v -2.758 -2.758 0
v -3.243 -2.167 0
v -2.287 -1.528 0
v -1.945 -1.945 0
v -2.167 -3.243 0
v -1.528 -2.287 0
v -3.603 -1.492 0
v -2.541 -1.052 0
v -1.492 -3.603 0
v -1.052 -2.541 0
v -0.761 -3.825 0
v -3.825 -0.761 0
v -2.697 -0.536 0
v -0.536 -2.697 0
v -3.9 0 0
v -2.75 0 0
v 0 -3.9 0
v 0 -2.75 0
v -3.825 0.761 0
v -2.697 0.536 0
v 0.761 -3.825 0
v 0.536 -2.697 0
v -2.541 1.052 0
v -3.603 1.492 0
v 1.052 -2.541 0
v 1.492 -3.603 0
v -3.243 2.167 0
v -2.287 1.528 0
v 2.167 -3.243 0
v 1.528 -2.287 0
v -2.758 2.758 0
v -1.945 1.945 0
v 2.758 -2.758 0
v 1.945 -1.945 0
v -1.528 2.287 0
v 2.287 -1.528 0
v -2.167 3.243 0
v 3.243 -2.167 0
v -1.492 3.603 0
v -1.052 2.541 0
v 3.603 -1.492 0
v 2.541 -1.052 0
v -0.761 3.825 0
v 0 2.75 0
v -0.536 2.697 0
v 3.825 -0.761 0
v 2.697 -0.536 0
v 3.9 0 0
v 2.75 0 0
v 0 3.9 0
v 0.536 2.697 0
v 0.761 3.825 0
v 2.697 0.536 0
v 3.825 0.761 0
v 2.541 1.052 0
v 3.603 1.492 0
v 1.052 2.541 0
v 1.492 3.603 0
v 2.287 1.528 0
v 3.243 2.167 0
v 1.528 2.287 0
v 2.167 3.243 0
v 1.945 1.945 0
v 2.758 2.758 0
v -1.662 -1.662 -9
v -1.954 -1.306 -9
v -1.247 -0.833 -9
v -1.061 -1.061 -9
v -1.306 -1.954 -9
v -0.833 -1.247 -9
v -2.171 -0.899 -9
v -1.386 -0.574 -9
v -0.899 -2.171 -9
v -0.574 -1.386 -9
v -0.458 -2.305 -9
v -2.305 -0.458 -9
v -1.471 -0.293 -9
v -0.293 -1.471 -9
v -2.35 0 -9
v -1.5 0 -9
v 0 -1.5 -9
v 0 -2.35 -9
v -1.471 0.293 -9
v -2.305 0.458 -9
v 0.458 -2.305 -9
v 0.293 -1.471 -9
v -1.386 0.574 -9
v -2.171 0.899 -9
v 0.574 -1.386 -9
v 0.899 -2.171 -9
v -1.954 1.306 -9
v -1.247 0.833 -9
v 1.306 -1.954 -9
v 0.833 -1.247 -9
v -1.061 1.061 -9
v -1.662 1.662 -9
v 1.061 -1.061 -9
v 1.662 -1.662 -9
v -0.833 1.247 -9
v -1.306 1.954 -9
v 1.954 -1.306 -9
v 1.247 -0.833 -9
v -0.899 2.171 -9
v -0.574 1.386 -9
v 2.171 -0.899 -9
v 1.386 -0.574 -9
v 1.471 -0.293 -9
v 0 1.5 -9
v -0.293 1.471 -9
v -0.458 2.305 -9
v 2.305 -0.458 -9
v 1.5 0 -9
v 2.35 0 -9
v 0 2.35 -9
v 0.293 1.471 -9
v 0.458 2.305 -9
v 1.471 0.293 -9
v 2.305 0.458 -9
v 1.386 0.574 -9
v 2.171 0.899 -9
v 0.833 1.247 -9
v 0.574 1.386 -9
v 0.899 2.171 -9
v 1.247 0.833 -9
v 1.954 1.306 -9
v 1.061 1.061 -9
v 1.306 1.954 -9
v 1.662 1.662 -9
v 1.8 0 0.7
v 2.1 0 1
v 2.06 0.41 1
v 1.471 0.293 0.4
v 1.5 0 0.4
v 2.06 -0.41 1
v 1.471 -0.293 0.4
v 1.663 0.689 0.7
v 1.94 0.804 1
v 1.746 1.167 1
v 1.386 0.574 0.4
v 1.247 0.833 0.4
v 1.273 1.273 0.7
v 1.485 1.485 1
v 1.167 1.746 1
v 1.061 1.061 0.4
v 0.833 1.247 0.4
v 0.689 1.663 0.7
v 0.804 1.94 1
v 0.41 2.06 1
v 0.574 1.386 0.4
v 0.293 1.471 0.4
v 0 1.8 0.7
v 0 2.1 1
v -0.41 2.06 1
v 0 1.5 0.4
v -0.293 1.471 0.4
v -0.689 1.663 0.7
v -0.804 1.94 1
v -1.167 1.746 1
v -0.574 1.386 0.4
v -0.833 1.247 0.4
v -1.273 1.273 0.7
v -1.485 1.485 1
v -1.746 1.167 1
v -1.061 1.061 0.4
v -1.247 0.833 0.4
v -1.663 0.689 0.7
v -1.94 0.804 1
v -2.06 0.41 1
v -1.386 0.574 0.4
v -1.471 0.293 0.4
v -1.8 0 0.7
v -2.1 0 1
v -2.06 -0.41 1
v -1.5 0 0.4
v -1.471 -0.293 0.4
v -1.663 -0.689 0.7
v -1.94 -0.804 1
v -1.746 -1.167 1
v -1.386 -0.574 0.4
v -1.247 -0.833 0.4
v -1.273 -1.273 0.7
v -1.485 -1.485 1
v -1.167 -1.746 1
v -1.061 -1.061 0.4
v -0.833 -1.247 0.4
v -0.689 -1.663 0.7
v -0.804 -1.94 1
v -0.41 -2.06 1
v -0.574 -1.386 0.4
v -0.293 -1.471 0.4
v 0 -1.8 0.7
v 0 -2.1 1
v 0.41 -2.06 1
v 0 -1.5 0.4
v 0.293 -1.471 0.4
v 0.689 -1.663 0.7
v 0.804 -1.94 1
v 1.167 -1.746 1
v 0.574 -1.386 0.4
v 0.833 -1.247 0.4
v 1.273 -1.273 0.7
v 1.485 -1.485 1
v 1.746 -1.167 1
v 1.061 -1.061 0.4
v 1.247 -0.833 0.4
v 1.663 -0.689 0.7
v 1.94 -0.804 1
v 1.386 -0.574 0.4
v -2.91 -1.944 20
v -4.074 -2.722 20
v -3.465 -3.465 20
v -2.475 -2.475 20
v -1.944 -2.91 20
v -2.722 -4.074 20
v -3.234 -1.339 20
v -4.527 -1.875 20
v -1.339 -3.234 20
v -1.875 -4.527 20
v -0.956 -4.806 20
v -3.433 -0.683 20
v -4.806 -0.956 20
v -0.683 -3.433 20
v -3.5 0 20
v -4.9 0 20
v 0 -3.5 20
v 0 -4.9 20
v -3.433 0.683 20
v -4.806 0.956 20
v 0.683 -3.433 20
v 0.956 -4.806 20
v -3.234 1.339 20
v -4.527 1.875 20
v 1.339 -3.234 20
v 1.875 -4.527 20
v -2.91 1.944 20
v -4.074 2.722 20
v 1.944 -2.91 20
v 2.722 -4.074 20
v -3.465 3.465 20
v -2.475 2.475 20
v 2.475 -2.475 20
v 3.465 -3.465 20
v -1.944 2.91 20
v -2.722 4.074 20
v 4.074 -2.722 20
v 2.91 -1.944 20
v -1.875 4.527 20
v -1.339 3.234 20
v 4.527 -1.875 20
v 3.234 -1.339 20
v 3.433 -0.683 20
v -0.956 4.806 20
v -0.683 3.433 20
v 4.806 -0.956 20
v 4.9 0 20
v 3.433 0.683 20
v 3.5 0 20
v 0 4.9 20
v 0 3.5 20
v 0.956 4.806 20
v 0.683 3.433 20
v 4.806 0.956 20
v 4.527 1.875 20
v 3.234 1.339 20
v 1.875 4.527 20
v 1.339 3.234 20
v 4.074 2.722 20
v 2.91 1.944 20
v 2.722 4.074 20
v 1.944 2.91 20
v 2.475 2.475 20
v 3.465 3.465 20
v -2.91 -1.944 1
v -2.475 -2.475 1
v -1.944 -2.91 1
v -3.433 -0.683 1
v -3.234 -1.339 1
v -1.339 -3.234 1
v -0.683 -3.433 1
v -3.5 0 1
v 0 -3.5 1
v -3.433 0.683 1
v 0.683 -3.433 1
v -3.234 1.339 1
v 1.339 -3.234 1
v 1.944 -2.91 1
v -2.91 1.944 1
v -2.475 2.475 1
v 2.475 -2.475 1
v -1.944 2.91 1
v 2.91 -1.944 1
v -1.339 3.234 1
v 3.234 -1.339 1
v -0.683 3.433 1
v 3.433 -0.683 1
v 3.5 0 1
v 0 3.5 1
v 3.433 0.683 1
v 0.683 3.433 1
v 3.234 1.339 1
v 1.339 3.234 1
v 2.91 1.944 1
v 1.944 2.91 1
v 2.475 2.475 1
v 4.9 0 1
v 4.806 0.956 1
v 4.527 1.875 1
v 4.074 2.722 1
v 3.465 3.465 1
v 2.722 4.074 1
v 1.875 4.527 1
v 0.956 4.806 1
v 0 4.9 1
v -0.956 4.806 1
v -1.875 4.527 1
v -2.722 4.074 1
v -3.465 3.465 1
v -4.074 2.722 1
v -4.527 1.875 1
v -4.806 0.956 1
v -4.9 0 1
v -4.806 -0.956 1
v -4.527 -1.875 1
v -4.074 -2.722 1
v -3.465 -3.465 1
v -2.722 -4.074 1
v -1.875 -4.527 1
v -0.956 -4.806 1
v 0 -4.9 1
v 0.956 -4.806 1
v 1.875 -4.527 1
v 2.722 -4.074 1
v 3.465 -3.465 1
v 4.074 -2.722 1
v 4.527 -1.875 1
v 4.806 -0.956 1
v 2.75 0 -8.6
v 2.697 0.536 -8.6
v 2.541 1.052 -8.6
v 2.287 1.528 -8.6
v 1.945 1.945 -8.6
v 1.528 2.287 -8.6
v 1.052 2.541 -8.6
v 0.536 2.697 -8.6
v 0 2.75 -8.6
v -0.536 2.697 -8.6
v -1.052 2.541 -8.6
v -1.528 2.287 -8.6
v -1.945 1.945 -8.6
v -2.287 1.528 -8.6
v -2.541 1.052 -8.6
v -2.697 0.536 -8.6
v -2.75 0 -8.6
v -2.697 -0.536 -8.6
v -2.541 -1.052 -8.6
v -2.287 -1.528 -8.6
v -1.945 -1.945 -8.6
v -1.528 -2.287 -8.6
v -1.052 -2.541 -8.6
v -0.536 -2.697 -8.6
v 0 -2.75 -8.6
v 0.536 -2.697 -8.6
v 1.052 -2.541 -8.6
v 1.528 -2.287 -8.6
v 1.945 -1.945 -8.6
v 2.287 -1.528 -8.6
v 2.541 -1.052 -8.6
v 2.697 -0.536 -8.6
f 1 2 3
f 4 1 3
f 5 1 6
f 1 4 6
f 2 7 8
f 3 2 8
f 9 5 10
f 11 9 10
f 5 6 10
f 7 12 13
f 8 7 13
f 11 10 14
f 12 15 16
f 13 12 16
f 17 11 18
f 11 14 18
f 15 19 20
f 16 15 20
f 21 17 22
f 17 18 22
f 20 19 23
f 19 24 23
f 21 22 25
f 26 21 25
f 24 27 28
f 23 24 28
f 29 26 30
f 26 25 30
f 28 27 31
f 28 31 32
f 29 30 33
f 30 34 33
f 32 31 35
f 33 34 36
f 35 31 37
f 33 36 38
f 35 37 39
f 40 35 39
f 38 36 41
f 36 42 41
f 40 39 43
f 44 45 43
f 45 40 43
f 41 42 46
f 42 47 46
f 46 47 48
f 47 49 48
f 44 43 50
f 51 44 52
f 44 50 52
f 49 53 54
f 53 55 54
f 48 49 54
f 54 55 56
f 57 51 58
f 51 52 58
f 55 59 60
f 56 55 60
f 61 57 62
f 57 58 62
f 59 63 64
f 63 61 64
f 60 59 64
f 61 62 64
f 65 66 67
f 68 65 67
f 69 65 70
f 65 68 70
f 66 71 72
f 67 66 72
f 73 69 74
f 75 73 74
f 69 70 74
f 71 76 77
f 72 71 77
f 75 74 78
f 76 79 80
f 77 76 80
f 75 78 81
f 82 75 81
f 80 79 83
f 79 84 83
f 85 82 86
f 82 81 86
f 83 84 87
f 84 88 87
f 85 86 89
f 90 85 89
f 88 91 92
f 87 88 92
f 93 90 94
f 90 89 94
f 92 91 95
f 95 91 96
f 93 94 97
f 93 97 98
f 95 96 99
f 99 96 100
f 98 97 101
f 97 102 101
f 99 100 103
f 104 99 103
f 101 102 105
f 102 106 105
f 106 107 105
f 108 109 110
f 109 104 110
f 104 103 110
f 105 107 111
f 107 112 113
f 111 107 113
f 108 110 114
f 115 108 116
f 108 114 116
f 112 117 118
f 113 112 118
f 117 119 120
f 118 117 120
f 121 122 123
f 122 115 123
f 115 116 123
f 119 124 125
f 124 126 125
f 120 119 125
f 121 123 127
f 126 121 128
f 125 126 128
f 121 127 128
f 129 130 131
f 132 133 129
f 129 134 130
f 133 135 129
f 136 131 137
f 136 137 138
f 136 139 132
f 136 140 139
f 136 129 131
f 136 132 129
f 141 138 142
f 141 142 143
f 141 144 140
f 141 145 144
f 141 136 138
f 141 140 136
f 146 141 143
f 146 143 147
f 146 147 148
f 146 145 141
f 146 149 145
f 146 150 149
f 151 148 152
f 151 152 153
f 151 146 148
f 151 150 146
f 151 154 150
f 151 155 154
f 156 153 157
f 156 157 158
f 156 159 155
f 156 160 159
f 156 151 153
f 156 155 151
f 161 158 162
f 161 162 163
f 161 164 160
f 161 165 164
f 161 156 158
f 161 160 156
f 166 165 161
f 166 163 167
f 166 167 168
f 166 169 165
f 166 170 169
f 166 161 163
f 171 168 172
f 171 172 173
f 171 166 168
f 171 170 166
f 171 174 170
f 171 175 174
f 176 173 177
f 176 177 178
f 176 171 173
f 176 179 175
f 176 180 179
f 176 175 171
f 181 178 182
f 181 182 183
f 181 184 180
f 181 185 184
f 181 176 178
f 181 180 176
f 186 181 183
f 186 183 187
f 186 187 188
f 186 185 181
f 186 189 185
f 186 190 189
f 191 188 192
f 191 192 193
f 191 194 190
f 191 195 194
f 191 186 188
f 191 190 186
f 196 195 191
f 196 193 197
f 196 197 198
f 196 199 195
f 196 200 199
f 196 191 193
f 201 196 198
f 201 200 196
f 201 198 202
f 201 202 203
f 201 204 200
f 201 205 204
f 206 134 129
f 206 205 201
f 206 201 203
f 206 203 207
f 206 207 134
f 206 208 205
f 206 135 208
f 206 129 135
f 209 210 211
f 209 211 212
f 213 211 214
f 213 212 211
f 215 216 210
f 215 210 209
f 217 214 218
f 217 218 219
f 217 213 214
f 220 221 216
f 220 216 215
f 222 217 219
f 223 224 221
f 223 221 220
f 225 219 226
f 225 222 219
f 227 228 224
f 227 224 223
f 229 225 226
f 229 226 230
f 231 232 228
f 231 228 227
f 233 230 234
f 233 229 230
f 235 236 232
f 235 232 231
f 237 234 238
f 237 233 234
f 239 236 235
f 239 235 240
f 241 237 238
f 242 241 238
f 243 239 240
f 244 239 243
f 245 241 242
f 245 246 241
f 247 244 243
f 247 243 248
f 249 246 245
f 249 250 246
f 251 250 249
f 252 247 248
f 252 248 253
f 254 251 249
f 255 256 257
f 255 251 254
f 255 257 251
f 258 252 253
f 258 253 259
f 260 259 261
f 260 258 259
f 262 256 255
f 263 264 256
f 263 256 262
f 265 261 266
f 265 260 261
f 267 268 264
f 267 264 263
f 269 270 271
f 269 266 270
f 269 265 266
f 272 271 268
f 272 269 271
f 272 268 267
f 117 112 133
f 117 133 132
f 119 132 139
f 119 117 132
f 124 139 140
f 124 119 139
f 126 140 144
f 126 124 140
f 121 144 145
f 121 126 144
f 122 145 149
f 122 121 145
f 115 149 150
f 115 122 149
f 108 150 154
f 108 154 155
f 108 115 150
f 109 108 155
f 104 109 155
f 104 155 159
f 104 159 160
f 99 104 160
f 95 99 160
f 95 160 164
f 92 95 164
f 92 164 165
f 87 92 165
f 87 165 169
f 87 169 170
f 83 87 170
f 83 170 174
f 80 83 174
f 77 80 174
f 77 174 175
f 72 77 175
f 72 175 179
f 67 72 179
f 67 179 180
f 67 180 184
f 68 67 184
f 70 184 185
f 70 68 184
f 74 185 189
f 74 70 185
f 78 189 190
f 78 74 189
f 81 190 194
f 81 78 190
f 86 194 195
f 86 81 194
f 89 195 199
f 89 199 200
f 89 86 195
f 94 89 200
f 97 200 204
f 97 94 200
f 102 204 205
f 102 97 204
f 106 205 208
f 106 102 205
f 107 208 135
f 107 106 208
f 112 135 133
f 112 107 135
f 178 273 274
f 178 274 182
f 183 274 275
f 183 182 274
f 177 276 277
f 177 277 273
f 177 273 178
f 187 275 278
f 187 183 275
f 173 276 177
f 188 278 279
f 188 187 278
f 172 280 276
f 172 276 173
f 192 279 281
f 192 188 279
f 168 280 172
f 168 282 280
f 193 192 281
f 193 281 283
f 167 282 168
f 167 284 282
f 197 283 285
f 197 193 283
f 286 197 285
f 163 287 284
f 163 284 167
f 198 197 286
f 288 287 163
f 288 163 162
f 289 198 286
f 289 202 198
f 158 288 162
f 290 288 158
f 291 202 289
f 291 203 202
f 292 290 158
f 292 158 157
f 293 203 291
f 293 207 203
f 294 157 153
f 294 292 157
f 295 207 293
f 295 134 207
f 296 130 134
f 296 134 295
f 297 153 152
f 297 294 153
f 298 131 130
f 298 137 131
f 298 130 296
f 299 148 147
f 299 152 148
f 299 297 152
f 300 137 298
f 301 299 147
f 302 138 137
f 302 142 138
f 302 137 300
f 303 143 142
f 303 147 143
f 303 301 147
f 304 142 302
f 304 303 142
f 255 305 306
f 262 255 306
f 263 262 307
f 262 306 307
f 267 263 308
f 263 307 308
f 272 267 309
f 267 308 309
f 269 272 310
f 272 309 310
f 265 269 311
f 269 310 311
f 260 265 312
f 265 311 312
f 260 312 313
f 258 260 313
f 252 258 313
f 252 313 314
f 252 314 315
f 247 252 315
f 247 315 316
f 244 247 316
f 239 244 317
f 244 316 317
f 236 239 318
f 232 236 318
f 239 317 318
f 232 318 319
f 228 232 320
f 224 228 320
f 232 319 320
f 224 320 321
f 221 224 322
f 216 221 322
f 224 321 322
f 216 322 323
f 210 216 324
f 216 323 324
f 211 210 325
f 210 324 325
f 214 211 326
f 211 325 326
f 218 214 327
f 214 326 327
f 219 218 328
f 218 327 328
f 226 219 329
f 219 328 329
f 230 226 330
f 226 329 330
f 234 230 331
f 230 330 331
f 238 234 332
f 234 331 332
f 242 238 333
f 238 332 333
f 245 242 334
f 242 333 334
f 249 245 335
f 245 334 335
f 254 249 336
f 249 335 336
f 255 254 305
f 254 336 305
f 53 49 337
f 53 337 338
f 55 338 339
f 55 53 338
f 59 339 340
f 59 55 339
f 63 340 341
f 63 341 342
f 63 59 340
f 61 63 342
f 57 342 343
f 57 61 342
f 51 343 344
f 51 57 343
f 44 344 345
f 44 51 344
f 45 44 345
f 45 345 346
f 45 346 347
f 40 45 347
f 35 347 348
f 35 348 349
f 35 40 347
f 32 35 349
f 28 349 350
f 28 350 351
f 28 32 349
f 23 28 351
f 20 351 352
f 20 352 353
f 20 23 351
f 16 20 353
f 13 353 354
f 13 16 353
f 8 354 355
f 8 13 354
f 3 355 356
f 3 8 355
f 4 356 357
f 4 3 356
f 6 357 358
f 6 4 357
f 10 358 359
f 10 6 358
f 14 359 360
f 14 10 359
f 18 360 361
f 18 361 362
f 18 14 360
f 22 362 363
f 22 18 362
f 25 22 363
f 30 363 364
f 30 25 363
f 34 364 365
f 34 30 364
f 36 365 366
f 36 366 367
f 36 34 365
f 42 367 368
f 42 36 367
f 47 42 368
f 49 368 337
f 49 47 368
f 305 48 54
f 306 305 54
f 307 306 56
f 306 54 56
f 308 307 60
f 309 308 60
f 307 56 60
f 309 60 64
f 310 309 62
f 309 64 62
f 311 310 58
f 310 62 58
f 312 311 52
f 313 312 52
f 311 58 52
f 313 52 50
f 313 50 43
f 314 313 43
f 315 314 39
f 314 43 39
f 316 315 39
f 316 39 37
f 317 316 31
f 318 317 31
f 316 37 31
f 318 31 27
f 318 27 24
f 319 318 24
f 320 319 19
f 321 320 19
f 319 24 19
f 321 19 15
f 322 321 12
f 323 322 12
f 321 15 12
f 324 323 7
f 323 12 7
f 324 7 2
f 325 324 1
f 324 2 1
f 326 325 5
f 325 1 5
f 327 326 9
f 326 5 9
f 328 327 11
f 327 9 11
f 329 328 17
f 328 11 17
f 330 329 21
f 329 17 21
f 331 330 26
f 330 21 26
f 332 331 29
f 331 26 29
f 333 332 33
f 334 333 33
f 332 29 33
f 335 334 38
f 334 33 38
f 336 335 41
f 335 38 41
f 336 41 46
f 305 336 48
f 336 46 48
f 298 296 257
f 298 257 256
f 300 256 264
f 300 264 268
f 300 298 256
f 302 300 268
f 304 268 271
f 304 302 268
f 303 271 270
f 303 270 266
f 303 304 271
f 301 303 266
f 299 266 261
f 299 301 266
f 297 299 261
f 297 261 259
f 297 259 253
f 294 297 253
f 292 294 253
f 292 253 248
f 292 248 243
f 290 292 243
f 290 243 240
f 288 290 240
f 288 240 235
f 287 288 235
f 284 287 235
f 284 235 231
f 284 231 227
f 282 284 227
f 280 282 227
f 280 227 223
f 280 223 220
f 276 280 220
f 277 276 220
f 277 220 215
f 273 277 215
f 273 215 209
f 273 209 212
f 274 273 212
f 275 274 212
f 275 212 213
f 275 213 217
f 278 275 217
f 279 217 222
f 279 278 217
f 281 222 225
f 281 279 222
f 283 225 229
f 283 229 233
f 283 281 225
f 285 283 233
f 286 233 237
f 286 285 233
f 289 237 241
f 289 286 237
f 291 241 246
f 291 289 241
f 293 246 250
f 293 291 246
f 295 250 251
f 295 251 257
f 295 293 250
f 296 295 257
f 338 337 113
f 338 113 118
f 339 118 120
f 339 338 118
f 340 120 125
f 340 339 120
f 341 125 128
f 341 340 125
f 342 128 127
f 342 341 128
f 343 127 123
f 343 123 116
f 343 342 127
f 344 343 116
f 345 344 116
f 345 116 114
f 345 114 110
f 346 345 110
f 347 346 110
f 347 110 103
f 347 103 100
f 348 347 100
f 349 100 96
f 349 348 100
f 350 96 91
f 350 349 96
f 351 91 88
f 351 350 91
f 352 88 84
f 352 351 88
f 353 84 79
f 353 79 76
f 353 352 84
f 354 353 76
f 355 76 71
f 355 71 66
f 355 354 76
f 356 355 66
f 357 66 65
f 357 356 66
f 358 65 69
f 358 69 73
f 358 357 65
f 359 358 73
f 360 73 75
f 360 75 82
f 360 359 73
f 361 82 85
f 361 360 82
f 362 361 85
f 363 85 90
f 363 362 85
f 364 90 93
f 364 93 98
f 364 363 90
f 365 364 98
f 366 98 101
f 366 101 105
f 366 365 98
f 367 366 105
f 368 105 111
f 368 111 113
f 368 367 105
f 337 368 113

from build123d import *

# Parameters (mm, degrees)
F0_R     = 2.75
F0_R_2   = 1.5
F1_DEPTH = 9
F0_R_3   = 3.5
F2_DEPTH = 1
F0_R_4   = 4.9
F3_DEPTH = 20
F4_SIZE  = 1
F5_SIZE  = 0.6
F6_SIZE  = 0.4


with BuildPart() as f1:
    # F0 (on Top) → F1 (new body)
    with BuildSketch(Plane.XY):
        Circle(F0_R)
        Circle(F0_R_2, mode=Mode.SUBTRACT)
    extrude(amount=-F1_DEPTH)

    # F0 (on Top) → F2 (join)
    with BuildSketch(Plane.XY):
        Circle(F0_R_3)
        Circle(F0_R, mode=Mode.SUBTRACT)
        Circle(F0_R)
        Circle(F0_R_2, mode=Mode.SUBTRACT)
    extrude(amount=F2_DEPTH)

    # F0 (on Top) → F3 (join)
    with BuildSketch(Plane.XY):
        Circle(F0_R_4)
        Circle(F0_R_3, mode=Mode.SUBTRACT)
    extrude(amount=F3_DEPTH)

    # F4
    f4_edges = [f1.edges().sort_by_distance(p)[0] for p in [
        (-4.9, 0, 0),
    ]]
    chamfer(f4_edges, length=F4_SIZE)

    # F5
    f5_edges = [f1.edges().sort_by_distance(p)[0] for p in [
        (-1.5, 0, 1),
    ]]
    chamfer(f5_edges, length=F5_SIZE)

    # F6
    f6_edges = [f1.edges().sort_by_distance(p)[0] for p in [
        (-2.75, 0, -9),
    ]]
    chamfer(f6_edges, length=F6_SIZE)


solid = f1.part
